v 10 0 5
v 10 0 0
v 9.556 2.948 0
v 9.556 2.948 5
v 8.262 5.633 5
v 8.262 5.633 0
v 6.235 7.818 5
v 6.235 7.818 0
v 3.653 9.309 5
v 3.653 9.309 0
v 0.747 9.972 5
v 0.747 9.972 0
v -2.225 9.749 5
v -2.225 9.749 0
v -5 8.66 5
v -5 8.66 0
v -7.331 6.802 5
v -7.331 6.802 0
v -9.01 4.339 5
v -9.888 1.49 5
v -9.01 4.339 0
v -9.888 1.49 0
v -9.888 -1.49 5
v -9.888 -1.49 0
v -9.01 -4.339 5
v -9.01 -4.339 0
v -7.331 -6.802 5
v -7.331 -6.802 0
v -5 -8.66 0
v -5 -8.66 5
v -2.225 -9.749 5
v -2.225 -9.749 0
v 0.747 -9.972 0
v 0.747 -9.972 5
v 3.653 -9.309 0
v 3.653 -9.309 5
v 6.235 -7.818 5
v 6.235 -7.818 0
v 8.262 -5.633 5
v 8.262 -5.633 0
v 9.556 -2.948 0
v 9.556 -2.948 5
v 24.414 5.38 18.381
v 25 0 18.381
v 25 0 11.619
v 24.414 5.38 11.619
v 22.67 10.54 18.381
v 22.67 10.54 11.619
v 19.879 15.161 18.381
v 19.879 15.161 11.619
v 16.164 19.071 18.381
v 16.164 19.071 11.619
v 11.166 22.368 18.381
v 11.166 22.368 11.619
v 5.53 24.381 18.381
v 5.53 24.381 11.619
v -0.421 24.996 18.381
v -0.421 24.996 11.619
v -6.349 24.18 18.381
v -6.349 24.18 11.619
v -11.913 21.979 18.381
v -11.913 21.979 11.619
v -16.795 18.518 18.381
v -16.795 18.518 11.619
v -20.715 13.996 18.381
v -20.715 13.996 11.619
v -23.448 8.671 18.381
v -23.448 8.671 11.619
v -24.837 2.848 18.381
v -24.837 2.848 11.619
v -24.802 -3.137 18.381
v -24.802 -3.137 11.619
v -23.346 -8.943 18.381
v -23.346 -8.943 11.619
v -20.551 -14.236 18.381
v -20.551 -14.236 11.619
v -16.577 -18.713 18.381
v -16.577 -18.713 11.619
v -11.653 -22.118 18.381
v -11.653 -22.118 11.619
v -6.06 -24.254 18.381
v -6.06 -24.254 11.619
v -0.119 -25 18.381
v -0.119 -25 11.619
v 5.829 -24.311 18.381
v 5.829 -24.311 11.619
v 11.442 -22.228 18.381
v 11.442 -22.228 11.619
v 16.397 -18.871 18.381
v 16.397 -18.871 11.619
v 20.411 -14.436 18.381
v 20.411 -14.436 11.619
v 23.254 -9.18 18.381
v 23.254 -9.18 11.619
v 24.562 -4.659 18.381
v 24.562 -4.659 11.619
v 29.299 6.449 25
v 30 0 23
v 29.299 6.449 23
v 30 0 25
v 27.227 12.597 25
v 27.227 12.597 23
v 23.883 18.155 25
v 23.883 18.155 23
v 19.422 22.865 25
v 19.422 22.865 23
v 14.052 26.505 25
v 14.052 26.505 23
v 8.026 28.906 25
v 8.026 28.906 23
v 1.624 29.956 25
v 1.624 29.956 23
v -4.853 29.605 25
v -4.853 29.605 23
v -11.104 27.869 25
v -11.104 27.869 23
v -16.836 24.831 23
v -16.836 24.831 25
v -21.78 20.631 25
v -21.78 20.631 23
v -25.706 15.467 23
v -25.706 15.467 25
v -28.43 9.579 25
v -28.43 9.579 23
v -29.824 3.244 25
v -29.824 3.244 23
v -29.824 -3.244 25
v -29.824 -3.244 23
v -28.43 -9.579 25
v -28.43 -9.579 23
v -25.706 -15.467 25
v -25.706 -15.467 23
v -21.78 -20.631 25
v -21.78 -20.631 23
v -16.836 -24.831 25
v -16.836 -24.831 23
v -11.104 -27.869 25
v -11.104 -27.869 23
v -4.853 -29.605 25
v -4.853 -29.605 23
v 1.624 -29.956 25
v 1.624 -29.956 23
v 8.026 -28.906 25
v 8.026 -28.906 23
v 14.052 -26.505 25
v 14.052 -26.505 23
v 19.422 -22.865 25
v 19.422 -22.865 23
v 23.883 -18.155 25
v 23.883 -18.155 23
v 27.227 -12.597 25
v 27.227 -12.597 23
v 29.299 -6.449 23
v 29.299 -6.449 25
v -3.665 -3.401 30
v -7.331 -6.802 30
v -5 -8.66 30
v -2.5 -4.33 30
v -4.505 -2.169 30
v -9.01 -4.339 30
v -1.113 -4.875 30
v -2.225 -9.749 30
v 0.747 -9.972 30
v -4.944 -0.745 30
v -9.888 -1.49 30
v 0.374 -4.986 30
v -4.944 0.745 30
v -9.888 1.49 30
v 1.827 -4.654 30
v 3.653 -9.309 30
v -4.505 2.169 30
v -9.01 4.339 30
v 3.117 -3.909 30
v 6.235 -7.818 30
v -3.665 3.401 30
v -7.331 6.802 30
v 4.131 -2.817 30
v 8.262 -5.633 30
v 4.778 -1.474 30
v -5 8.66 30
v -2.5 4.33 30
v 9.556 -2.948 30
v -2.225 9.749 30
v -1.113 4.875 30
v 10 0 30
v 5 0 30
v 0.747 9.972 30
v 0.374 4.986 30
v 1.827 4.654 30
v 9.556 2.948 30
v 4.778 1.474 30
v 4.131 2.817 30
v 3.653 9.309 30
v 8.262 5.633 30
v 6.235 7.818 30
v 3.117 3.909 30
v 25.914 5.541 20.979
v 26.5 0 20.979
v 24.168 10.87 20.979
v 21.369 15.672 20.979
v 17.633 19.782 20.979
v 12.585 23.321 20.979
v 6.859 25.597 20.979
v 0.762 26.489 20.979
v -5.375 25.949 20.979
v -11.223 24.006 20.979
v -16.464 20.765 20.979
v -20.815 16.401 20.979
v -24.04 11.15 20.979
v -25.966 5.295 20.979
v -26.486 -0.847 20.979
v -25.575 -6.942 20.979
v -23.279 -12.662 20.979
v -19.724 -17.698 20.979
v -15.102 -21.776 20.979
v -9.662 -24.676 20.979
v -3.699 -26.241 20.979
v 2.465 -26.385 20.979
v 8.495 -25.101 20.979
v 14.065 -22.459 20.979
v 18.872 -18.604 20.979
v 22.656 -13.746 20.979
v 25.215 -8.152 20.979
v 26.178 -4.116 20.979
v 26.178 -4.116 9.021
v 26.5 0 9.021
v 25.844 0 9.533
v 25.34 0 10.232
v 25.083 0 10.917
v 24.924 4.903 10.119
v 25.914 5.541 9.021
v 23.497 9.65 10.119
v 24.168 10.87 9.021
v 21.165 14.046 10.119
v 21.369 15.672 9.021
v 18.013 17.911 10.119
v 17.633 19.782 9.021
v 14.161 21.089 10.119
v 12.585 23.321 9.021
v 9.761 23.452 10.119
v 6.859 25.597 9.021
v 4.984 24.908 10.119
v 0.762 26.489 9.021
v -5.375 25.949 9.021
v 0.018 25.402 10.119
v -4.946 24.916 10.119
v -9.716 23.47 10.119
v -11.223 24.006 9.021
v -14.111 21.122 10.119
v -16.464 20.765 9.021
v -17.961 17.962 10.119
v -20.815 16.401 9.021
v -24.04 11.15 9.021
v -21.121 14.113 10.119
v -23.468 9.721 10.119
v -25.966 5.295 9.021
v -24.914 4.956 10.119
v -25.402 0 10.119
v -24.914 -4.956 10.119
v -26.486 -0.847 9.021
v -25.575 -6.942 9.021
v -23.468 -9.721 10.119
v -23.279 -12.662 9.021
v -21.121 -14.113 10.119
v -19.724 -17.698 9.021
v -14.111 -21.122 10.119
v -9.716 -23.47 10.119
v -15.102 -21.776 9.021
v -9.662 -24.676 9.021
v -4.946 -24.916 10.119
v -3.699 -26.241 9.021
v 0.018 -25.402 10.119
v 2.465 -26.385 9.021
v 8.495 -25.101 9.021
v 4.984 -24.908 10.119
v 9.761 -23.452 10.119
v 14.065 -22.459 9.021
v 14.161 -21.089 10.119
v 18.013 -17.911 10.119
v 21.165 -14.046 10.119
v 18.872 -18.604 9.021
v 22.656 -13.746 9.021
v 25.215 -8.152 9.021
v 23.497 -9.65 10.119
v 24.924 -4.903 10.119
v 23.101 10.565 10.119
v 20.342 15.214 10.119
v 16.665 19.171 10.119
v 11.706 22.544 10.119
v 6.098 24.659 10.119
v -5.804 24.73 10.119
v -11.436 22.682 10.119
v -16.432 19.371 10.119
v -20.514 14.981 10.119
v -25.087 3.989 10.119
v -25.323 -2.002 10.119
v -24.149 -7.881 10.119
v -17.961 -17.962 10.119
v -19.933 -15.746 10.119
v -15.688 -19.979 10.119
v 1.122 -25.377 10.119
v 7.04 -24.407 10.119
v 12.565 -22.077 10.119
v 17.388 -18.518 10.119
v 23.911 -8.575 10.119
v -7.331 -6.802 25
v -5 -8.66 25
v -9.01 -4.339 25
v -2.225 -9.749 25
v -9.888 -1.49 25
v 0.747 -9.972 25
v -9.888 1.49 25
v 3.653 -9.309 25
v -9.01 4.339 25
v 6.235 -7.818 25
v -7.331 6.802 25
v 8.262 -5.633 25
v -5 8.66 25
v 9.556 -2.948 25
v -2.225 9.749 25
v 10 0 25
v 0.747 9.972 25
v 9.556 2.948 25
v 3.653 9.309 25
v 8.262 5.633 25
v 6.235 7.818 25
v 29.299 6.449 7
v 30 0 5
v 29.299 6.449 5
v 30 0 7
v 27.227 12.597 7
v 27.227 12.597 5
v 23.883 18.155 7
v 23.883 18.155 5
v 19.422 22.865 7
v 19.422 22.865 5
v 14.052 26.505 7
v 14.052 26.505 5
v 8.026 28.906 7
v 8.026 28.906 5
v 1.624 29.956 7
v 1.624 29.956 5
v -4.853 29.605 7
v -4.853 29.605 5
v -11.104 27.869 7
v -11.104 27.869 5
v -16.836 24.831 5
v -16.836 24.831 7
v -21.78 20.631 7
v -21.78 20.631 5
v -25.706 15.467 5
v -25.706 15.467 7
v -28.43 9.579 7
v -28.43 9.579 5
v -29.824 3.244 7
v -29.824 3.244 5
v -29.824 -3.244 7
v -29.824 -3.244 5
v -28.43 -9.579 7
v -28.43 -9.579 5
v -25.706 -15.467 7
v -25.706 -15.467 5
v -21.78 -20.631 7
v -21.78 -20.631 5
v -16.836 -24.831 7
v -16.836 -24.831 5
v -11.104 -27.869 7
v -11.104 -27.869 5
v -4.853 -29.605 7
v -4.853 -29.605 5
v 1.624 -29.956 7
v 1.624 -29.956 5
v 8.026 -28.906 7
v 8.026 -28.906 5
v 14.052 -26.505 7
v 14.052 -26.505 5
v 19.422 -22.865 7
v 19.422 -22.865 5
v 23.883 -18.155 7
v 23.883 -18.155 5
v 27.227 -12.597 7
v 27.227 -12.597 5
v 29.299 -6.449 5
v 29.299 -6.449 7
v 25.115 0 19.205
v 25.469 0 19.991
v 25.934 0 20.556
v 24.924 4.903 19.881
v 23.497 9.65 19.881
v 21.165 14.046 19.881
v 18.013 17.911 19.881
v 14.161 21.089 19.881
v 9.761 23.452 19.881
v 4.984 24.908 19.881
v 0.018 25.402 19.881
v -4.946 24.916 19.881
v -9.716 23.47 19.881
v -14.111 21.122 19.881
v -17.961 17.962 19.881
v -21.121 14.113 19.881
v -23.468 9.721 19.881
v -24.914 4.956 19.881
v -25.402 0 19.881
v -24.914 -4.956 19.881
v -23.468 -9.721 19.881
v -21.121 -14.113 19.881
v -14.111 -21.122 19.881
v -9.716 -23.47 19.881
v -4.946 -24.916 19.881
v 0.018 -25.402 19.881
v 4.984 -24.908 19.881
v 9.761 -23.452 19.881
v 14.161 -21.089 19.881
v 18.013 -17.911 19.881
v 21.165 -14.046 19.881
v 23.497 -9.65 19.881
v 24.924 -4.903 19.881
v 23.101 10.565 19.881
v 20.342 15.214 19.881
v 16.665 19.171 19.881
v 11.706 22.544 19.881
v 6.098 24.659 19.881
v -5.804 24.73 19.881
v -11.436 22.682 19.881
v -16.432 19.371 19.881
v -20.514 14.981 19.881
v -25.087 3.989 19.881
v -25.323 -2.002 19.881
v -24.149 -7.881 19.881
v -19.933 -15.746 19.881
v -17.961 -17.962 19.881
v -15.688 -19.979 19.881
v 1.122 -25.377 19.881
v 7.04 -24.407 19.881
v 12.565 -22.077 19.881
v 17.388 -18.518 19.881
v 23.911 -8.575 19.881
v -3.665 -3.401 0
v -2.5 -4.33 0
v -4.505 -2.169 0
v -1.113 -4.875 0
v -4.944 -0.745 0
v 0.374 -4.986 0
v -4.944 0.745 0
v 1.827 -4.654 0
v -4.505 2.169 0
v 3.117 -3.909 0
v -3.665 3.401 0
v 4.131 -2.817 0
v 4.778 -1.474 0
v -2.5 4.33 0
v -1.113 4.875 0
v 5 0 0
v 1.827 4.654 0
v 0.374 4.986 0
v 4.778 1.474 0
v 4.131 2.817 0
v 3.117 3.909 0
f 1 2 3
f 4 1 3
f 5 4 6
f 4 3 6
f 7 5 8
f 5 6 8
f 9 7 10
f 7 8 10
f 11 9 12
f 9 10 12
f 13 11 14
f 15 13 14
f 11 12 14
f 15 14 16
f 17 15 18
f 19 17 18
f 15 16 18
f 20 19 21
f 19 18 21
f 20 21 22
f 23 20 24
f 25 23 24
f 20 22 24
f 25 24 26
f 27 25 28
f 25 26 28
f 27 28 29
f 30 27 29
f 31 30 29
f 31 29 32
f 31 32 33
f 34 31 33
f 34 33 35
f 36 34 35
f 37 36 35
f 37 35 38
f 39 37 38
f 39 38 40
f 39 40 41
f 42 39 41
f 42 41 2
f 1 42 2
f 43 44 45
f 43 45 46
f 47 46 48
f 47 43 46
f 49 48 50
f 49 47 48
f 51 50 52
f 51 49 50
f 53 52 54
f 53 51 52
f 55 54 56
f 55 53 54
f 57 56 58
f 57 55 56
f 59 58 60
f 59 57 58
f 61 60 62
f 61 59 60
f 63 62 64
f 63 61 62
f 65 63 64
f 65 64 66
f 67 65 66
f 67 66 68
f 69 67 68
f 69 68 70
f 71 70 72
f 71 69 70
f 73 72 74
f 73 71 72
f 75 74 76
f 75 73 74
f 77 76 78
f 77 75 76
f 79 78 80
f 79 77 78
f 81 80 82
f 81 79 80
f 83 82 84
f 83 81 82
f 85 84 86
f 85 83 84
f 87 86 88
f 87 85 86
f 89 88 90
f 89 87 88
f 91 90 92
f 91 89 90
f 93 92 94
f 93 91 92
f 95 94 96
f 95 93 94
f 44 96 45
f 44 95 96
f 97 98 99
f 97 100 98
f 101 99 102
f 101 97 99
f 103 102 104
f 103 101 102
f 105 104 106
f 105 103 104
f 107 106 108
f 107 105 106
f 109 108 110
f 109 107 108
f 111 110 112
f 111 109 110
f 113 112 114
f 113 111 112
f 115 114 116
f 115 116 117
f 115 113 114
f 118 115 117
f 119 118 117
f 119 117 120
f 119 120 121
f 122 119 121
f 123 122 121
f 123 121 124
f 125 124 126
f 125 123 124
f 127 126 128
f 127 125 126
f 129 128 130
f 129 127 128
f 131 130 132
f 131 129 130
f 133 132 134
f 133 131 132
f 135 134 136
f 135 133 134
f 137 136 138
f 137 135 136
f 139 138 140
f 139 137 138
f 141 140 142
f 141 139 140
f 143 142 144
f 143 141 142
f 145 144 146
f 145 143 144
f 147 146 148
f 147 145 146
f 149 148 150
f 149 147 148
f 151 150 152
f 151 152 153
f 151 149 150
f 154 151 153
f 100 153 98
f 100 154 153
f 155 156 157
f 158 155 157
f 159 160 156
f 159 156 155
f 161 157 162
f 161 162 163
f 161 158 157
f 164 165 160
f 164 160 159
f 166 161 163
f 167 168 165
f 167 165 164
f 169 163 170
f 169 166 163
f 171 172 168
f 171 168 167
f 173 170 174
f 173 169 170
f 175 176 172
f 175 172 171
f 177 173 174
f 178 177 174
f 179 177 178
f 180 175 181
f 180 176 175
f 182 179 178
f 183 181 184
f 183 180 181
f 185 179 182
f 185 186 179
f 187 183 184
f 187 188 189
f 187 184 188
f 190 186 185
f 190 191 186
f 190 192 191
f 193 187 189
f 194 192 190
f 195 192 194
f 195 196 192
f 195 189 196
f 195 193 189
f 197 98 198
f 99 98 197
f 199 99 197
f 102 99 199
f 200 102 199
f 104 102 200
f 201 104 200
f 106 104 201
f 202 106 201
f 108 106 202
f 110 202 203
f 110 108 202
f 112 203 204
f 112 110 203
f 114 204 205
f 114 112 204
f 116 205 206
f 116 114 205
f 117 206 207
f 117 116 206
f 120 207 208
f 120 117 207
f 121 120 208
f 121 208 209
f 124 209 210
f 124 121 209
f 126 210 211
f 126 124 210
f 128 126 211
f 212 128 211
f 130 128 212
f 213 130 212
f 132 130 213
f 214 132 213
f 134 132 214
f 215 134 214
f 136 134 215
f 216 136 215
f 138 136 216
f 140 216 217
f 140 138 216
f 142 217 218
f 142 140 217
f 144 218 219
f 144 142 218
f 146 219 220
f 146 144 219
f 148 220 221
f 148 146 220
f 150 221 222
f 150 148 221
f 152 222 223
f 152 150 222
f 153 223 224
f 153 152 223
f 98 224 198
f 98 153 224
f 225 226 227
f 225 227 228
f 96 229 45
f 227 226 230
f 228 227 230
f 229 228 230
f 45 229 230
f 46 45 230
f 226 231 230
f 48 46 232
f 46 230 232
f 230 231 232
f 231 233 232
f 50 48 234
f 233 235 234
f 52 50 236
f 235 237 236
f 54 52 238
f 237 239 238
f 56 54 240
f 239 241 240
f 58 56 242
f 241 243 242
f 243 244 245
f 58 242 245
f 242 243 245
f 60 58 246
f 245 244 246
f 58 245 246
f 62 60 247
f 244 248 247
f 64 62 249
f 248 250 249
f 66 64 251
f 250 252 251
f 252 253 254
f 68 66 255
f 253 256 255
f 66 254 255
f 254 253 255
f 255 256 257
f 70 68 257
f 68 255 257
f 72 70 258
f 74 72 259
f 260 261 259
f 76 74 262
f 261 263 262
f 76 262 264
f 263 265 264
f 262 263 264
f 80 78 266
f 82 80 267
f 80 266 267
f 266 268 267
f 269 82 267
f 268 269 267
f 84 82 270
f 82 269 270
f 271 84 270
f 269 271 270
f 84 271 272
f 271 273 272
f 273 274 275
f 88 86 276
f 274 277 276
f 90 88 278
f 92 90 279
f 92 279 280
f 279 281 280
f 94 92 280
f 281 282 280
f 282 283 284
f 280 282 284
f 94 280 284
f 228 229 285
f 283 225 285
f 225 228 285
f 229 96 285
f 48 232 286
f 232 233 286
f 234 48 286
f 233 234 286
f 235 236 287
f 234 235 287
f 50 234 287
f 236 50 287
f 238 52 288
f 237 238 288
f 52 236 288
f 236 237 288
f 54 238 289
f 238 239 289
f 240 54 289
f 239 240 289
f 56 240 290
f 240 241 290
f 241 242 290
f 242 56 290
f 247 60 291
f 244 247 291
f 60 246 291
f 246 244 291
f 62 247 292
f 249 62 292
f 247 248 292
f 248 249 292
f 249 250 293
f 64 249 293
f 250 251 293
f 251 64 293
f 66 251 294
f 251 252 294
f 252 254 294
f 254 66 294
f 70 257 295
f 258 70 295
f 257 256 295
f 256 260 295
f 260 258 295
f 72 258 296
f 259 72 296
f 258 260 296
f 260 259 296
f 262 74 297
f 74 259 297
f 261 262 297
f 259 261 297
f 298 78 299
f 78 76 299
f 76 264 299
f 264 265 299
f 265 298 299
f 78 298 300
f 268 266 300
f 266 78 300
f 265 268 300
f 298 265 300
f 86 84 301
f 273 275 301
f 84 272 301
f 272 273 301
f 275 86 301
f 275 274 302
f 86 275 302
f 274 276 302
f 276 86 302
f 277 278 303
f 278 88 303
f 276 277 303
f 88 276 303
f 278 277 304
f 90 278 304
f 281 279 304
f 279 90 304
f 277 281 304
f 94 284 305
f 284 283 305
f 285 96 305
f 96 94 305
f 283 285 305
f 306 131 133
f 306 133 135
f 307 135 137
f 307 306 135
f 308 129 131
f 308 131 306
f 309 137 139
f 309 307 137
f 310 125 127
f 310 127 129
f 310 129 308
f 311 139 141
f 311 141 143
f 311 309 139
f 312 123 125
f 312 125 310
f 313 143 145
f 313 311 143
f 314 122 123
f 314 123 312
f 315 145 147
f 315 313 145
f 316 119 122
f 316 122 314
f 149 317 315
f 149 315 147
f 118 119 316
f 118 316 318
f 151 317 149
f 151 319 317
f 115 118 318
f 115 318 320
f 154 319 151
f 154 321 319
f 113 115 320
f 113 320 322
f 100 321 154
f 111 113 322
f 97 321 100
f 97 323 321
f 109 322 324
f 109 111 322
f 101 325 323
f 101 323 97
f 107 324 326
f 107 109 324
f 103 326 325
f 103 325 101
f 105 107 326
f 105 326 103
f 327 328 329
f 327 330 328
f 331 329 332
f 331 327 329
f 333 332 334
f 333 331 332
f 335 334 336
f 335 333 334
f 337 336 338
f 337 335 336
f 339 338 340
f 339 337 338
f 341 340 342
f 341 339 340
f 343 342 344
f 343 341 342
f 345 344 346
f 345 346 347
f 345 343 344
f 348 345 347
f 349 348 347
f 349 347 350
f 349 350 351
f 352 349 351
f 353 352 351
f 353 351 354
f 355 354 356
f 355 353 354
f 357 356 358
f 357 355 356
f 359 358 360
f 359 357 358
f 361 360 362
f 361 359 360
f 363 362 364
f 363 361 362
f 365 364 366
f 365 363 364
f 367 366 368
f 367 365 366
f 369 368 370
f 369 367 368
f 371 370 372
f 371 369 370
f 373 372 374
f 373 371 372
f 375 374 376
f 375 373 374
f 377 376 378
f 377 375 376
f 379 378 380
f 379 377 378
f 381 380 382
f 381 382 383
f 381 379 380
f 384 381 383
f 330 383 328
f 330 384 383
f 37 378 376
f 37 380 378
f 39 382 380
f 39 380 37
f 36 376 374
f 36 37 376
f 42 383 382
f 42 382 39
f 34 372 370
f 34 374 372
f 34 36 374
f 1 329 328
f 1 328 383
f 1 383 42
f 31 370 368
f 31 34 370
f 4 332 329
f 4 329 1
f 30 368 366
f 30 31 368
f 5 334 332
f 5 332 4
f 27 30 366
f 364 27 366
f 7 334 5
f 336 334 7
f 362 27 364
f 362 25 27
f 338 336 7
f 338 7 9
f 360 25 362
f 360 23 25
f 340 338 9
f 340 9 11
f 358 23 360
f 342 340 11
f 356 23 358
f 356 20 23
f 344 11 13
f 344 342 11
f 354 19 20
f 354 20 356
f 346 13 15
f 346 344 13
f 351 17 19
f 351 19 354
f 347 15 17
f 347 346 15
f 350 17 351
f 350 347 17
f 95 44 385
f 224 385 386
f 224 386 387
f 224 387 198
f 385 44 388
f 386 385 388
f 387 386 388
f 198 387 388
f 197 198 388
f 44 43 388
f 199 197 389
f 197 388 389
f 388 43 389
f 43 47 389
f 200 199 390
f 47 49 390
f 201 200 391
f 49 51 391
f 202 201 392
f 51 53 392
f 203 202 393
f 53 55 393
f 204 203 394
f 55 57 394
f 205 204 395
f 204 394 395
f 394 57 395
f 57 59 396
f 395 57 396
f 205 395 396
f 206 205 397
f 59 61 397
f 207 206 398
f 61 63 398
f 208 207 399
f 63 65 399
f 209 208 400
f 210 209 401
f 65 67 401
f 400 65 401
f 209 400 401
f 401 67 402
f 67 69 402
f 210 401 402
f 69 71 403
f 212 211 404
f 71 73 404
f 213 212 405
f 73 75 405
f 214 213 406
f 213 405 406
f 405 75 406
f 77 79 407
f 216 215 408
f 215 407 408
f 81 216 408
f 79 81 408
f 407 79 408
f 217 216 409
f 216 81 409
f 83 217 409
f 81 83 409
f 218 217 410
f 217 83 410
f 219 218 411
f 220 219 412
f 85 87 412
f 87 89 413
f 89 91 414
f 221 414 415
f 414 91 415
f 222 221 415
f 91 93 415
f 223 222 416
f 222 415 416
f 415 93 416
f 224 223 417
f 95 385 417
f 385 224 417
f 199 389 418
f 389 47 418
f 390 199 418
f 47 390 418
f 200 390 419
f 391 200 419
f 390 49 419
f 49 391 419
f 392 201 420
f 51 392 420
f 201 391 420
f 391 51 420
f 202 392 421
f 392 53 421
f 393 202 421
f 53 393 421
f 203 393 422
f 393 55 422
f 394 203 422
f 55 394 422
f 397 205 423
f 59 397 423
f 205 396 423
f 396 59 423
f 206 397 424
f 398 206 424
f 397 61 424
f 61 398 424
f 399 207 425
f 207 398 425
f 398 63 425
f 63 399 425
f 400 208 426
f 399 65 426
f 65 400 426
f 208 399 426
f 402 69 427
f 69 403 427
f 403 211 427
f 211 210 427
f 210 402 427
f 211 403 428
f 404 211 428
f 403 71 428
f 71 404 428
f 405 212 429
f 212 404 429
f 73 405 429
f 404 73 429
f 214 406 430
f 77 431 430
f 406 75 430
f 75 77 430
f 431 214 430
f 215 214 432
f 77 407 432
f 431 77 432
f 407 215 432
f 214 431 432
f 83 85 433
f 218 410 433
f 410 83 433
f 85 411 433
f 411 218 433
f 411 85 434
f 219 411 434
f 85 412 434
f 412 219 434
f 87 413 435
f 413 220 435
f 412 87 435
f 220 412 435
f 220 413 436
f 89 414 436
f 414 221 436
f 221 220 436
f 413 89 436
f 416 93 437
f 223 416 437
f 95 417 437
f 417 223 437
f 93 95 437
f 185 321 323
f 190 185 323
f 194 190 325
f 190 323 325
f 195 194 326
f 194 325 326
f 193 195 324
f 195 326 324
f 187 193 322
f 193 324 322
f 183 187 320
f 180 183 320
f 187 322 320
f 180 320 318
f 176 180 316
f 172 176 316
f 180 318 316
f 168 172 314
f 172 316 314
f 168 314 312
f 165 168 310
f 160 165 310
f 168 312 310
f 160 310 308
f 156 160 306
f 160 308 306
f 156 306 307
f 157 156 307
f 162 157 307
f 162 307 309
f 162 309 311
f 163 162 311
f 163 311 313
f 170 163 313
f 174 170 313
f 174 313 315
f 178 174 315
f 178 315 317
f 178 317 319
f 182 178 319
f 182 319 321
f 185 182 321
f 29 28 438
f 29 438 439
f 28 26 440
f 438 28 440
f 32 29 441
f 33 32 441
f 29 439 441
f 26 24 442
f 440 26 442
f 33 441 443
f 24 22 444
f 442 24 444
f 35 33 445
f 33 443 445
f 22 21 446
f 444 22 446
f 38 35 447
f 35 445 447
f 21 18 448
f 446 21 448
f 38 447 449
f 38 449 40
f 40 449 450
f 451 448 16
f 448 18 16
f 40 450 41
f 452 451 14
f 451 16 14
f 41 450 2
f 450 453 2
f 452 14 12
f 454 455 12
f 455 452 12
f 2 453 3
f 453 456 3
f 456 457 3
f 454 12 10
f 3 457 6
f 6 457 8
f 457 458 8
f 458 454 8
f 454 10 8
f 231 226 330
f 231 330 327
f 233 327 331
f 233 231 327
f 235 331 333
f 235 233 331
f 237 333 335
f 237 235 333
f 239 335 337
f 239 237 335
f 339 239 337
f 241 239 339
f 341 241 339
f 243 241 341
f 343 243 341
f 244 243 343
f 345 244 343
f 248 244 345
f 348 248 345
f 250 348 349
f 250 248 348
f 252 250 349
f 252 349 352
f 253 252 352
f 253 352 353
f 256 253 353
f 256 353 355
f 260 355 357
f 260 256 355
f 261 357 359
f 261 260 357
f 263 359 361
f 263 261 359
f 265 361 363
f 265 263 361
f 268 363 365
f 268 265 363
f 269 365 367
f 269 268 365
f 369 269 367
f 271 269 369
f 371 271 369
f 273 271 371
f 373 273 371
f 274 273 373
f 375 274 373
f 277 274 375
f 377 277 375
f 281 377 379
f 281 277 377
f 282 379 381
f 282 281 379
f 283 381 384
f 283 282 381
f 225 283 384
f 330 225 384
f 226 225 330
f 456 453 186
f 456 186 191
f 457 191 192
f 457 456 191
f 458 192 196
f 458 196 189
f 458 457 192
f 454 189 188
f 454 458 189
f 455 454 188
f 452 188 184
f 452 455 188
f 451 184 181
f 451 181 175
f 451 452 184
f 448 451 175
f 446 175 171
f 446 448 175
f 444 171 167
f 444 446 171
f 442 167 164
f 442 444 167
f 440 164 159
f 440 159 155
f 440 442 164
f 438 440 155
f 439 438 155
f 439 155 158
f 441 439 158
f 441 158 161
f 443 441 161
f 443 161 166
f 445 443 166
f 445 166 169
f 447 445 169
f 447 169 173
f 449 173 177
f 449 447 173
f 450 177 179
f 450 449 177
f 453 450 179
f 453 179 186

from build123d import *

# Parameters (mm, degrees)
SKETCH1_R           = 10
SKETCH1_R_2         = 5
BOSS_EXTRUDE1_DEPTH = 30
FILLET1_R           = 3


with BuildPart() as part:
    # Sketch1 → Boss-Extrude1 (new body)
    with BuildSketch(Plane.XY):
        Circle(SKETCH1_R)
        Circle(SKETCH1_R_2, mode=Mode.SUBTRACT)
    extrude(amount=BOSS_EXTRUDE1_DEPTH)

    # Sketch4 → Revolve1 (revolve)
    with BuildSketch(Plane(origin=(0, 0, 0), x_dir=(1, 0, 0), z_dir=(0, 1, 0))):
        Polygon((10, -5), (30, -5), (30, -7), (25, -9.886751346), (25, -20.113248654), (30, -23), (30, -25), (10, -25), align=None)
    revolve(axis=Axis((0, 0, 0), (0, 0, 1)))

    # Fillet1
    fillet1_edges = [part.edges().sort_by_distance(p)[0] for p in [
        (-25, 0, 20.113248654),
        (-25, 0, 9.886751346),
    ]]
    fillet(fillet1_edges, radius=FILLET1_R)


solid = part.part
